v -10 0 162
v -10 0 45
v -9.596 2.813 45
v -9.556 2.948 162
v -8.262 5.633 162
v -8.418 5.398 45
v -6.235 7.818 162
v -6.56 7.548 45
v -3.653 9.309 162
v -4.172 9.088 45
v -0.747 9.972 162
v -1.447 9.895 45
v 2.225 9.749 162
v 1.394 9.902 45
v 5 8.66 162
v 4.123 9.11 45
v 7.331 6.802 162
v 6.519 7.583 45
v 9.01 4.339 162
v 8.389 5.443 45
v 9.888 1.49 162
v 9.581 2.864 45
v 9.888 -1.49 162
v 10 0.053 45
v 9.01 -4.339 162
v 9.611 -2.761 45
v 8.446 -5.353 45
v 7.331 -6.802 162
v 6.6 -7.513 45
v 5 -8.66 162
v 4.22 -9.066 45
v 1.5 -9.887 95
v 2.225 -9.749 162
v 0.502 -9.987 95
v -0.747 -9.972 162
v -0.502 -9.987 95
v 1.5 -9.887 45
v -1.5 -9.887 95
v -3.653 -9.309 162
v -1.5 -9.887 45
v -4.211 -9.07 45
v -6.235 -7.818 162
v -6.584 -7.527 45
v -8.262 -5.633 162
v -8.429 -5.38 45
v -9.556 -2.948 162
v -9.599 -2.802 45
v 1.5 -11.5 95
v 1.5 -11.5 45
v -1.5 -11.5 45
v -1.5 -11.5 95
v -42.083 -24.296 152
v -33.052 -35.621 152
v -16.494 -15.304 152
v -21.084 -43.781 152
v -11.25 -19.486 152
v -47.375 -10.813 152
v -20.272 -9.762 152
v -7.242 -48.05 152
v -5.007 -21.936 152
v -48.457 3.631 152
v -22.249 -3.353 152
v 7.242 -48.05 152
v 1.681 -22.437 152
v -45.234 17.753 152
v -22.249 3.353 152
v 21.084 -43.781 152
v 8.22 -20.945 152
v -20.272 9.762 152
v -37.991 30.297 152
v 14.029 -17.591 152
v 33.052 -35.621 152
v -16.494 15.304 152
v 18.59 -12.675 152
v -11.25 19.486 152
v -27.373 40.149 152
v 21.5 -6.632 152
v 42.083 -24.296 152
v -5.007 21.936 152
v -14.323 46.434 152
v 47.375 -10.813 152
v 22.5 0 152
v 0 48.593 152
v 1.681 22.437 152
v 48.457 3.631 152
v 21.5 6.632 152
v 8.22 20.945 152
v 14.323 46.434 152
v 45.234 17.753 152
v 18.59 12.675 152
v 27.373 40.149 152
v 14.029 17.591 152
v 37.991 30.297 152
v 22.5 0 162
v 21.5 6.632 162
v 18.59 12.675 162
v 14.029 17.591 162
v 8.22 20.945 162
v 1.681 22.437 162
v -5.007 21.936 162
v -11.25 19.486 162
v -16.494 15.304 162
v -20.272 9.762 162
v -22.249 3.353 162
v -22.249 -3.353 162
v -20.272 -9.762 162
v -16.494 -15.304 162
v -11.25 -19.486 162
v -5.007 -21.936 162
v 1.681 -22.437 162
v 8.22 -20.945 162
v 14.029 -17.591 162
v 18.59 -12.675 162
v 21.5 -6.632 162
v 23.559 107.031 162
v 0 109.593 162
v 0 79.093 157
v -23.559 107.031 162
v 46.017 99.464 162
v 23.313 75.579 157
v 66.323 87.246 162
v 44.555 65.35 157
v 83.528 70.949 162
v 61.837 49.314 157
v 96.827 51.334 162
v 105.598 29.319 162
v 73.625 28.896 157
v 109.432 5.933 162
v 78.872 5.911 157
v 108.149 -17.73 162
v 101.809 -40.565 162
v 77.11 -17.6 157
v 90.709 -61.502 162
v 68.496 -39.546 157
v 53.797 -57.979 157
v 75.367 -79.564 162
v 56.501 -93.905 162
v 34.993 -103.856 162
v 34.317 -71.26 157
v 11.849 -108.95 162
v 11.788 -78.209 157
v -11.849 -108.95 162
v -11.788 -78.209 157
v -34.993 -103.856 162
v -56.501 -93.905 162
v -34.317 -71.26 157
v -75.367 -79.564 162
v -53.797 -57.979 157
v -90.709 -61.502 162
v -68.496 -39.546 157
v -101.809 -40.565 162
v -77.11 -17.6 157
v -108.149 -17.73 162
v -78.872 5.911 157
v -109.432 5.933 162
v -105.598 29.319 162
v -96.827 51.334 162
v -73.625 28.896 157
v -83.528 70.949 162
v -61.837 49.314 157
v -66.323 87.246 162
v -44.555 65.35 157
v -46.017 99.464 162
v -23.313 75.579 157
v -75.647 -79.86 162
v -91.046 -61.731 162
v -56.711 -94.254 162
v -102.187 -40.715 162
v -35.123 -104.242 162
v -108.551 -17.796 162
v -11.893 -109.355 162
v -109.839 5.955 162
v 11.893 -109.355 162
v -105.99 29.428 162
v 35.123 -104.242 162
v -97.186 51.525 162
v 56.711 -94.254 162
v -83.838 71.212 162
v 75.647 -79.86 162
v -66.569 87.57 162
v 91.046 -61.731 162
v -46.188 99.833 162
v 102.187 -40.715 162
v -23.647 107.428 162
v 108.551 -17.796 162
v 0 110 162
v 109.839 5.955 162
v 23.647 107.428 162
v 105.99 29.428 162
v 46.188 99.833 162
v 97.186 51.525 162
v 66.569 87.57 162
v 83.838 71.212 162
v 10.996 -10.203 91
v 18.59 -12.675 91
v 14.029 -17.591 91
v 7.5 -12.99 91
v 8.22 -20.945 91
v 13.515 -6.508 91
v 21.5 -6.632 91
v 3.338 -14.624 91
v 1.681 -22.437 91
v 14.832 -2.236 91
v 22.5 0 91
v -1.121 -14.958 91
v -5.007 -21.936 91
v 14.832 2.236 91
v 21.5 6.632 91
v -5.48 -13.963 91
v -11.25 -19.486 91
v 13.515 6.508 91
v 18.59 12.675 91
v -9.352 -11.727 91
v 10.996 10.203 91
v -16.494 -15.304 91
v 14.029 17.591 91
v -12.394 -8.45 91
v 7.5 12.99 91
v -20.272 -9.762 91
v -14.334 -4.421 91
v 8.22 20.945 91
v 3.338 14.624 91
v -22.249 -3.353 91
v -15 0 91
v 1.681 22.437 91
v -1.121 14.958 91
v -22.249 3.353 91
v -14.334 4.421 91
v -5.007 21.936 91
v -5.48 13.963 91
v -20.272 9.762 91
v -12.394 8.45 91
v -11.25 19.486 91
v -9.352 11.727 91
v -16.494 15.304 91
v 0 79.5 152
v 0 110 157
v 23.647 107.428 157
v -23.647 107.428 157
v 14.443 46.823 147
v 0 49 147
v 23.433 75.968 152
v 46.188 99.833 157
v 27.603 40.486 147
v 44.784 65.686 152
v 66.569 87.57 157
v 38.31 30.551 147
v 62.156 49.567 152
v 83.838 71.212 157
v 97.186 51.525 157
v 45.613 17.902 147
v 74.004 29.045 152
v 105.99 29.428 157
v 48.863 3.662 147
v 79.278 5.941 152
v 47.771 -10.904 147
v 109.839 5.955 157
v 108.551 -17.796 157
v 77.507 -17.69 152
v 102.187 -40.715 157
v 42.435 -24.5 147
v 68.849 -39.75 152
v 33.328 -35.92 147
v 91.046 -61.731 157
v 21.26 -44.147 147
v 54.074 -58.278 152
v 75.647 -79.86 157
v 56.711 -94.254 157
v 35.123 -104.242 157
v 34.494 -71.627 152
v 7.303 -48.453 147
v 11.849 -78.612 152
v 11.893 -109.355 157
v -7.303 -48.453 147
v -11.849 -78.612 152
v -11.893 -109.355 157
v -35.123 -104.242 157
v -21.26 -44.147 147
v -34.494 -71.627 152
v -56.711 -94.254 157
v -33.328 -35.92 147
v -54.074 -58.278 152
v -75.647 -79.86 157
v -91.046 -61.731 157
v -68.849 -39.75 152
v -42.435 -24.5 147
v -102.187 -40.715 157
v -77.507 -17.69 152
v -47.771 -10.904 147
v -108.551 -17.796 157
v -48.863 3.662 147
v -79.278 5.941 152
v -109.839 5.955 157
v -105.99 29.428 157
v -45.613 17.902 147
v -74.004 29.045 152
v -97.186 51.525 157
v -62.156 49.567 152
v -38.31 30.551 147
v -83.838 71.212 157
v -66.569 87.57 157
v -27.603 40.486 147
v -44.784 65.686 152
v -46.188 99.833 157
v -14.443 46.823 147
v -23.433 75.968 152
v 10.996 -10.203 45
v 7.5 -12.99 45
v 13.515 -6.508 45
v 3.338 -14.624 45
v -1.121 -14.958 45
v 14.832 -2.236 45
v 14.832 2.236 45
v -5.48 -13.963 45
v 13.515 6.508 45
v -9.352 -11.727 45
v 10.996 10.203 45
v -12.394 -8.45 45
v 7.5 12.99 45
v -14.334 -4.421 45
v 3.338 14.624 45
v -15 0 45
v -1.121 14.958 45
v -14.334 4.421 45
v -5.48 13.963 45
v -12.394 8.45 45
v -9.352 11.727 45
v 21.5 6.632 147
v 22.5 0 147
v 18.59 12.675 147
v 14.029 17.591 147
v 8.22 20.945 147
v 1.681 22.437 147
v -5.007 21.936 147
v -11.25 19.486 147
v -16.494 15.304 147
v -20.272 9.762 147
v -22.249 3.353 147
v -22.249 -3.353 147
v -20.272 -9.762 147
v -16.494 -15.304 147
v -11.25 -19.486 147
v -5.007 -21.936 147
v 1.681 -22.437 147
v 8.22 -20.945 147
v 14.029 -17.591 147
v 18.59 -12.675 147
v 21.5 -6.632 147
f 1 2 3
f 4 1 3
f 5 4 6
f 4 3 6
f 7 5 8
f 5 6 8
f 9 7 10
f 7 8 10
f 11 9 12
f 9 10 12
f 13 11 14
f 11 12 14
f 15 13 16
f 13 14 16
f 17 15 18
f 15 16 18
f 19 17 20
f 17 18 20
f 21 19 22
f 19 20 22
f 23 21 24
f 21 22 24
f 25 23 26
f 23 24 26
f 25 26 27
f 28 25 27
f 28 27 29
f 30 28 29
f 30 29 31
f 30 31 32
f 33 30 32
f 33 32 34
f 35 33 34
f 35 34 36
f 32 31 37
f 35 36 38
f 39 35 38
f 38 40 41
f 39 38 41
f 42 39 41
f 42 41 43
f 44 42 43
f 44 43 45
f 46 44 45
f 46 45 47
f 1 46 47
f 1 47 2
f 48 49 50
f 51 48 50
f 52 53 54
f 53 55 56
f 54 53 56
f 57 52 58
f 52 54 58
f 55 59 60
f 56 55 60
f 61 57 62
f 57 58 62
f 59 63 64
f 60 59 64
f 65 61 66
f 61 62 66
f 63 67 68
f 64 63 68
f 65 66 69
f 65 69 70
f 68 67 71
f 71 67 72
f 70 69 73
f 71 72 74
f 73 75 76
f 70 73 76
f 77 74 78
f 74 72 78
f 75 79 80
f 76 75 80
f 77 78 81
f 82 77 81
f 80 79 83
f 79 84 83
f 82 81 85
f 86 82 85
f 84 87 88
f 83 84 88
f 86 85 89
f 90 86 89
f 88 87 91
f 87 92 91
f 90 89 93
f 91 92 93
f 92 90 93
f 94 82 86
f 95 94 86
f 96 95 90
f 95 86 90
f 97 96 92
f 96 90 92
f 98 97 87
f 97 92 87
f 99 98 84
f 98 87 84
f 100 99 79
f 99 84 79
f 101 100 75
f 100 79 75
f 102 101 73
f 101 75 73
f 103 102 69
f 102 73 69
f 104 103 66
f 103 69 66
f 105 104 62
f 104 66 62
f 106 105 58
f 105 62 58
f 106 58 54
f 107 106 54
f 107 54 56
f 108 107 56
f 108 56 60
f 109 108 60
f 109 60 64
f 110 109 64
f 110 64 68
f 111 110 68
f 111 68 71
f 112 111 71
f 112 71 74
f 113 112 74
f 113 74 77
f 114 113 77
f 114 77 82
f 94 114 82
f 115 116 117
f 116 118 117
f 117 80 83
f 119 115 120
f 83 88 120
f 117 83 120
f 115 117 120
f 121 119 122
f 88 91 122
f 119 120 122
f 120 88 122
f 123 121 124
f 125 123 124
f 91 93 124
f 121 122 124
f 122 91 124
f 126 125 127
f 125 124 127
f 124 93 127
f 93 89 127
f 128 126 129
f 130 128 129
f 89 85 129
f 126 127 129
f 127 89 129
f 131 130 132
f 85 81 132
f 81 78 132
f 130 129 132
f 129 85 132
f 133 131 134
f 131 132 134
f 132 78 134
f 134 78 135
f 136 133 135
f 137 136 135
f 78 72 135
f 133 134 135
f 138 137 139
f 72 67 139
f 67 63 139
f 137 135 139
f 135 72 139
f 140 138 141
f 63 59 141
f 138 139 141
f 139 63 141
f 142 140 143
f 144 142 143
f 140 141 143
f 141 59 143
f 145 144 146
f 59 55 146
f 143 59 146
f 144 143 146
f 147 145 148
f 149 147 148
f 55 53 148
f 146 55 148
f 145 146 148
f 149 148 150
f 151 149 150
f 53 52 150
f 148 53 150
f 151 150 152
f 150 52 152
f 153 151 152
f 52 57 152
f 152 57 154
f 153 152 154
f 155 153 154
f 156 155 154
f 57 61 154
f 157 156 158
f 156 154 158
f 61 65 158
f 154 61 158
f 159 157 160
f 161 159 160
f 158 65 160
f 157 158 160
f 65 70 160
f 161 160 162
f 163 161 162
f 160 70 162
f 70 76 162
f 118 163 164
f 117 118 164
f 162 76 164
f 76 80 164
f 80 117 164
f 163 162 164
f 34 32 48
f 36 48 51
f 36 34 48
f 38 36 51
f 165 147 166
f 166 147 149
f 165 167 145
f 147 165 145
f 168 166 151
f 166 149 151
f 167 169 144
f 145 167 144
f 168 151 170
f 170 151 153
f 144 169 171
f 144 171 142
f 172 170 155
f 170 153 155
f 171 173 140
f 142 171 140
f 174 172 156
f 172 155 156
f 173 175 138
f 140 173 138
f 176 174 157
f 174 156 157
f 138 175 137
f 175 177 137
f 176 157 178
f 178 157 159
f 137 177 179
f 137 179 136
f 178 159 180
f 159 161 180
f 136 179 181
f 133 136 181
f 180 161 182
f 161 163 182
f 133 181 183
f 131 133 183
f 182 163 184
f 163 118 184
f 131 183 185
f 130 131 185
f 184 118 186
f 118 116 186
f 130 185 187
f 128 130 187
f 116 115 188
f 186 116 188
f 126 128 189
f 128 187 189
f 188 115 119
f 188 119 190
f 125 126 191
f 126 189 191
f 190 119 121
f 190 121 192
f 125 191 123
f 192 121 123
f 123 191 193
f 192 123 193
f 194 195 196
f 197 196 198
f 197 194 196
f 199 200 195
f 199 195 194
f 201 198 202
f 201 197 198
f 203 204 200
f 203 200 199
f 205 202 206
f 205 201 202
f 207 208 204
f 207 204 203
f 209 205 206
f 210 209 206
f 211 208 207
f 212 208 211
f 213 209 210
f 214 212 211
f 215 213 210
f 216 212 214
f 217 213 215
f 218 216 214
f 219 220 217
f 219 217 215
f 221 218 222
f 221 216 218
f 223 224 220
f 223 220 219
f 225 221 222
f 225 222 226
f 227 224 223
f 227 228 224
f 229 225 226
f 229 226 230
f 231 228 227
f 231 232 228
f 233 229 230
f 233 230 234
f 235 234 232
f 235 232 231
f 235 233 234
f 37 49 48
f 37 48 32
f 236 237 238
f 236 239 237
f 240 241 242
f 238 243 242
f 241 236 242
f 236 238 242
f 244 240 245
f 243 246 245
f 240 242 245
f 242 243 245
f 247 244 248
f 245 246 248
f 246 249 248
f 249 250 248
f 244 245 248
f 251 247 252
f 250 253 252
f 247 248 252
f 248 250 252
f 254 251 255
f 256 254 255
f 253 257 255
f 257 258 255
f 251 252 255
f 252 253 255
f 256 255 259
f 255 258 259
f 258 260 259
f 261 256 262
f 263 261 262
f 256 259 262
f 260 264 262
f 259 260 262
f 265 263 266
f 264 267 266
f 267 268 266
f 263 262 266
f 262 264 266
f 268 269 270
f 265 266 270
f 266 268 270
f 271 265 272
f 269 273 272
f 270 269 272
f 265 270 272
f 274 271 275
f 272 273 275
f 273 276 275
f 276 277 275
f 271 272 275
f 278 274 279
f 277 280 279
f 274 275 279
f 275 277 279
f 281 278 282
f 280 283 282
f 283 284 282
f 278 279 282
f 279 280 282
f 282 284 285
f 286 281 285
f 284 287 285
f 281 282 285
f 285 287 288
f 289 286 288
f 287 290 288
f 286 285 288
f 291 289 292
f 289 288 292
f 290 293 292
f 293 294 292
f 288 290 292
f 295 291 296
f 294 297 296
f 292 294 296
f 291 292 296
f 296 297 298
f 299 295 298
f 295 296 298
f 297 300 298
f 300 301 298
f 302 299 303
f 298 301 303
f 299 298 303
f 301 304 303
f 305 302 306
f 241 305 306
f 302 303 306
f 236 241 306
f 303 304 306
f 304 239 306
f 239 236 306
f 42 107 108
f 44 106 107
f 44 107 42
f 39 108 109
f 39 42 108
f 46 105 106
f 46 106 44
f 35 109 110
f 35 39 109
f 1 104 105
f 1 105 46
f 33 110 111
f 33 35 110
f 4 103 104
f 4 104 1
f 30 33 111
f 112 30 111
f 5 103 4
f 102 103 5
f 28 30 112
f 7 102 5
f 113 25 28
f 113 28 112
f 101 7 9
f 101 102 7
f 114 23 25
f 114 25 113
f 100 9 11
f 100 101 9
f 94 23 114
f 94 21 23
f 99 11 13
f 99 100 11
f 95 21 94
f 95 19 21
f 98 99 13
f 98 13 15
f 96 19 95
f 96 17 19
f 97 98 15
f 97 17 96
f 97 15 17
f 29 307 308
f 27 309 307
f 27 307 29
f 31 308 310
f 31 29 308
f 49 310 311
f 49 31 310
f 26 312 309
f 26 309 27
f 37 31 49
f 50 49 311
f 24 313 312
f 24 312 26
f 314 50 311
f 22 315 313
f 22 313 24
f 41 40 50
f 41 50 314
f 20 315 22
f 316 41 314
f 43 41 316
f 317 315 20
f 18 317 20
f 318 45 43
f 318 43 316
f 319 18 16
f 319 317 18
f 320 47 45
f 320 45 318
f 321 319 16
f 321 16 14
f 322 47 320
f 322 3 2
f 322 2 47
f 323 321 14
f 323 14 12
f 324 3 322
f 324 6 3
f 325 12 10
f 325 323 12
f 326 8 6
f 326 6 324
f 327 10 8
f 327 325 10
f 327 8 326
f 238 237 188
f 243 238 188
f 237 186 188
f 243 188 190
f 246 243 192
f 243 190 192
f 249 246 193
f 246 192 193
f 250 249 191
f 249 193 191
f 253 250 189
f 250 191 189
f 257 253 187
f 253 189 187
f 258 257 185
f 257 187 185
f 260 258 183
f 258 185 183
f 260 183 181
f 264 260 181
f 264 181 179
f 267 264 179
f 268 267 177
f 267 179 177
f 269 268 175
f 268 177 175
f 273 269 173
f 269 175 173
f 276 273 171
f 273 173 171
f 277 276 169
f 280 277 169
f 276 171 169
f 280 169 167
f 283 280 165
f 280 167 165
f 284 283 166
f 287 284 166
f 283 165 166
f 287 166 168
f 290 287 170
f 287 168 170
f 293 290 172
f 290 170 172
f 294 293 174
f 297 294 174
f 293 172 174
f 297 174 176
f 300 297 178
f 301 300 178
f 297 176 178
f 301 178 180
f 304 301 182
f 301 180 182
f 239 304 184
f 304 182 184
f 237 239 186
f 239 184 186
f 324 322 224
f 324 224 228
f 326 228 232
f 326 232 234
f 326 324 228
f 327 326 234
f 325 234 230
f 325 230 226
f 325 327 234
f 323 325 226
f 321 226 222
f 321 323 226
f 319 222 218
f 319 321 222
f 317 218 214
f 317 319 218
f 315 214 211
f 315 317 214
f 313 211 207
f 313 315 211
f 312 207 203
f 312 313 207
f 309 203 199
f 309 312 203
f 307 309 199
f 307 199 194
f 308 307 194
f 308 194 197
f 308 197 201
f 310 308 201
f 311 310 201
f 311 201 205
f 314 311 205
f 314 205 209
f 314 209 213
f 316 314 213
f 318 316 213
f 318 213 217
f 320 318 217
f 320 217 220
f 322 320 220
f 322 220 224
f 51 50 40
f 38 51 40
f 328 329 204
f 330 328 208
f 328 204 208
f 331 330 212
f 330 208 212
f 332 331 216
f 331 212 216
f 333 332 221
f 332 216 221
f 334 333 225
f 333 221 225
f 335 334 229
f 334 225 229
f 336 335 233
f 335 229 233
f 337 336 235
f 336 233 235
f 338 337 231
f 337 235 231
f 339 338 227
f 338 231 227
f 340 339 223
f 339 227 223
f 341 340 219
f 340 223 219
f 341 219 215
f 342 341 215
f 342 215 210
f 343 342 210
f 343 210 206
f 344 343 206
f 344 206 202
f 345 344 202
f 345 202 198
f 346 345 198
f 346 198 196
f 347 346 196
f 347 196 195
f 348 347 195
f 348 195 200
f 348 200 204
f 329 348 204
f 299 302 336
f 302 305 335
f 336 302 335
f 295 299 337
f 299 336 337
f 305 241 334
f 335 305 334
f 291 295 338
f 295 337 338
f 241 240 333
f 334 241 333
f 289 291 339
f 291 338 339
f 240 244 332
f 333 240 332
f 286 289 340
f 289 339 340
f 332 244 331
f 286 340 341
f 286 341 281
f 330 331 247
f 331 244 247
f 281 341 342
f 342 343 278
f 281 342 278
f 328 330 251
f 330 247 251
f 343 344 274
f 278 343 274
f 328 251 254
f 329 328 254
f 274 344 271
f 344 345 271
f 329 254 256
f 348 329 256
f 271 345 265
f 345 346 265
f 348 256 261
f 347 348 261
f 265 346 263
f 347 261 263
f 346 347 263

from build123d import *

# Parameters (mm, degrees)
SKETCH1_R           = 22.5
BOSS_EXTRUDE1_DEPTH = 162
SKETCH4_R           = 22.5
SKETCH4_R_2         = 15
CUT_EXTRUDE1_DEPTH  = 91
SKETCH5_R           = 15
CUT_EXTRUDE2_DEPTH  = 45
SKETCH12_R          = 10
CUT_EXTRUDE3_DEPTH  = 118
SKETCH13_W          = 3
SKETCH13_H          = 3
CUT_EXTRUDE4_DEPTH  = 50


with BuildPart() as part:
    # Sketch1 → Boss-Extrude1 (new body)
    with BuildSketch(Plane.XY):
        Circle(SKETCH1_R)
    extrude(amount=BOSS_EXTRUDE1_DEPTH)

    # Sketch3 → Revolve1 (revolve)
    with BuildSketch(Plane(origin=(0, 0, 0), x_dir=(0, 0, -1), z_dir=(1, 0, 0))):
        Polygon((-157, 110), (-162, 110), (-162, 109.592881079), (-152, 48.592881079), (-152, 22.5), (-147, 22.5), (-147, 49), align=None)
    revolve(axis=Axis((0, 0, 162), (0, 0, -1)))

    # Sketch4 → Cut-Extrude1 (cut)
    with BuildSketch(Plane(origin=(0, 0, 0), x_dir=(-1, 0, 0), z_dir=(0, 0, -1))):
        Circle(SKETCH4_R)
        Circle(SKETCH4_R_2, mode=Mode.SUBTRACT)
    extrude(amount=-CUT_EXTRUDE1_DEPTH, mode=Mode.SUBTRACT)

    # Sketch5 → Cut-Extrude2 (cut)
    with BuildSketch(Plane(origin=(0, 0, 0), x_dir=(-1, 0, 0), z_dir=(0, 0, -1))):
        Circle(SKETCH5_R)
    extrude(amount=-CUT_EXTRUDE2_DEPTH, mode=Mode.SUBTRACT)

    # Sketch12 → Cut-Extrude3 (cut, through all)
    with BuildSketch(Plane(origin=(0, 0, 45), x_dir=(-1, 0, 0), z_dir=(0, 0, -1))):
        Circle(SKETCH12_R)
    extrude(amount=-CUT_EXTRUDE3_DEPTH, mode=Mode.SUBTRACT)

    # Sketch13 → Cut-Extrude4 (cut)
    with BuildSketch(Plane(origin=(0, 0, 45), x_dir=(-1, 0, 0), z_dir=(0, 0, -1))):
        with Locations((0, -10)):
            Rectangle(SKETCH13_W, SKETCH13_H)
    extrude(amount=-CUT_EXTRUDE4_DEPTH, mode=Mode.SUBTRACT)


solid = part.part
